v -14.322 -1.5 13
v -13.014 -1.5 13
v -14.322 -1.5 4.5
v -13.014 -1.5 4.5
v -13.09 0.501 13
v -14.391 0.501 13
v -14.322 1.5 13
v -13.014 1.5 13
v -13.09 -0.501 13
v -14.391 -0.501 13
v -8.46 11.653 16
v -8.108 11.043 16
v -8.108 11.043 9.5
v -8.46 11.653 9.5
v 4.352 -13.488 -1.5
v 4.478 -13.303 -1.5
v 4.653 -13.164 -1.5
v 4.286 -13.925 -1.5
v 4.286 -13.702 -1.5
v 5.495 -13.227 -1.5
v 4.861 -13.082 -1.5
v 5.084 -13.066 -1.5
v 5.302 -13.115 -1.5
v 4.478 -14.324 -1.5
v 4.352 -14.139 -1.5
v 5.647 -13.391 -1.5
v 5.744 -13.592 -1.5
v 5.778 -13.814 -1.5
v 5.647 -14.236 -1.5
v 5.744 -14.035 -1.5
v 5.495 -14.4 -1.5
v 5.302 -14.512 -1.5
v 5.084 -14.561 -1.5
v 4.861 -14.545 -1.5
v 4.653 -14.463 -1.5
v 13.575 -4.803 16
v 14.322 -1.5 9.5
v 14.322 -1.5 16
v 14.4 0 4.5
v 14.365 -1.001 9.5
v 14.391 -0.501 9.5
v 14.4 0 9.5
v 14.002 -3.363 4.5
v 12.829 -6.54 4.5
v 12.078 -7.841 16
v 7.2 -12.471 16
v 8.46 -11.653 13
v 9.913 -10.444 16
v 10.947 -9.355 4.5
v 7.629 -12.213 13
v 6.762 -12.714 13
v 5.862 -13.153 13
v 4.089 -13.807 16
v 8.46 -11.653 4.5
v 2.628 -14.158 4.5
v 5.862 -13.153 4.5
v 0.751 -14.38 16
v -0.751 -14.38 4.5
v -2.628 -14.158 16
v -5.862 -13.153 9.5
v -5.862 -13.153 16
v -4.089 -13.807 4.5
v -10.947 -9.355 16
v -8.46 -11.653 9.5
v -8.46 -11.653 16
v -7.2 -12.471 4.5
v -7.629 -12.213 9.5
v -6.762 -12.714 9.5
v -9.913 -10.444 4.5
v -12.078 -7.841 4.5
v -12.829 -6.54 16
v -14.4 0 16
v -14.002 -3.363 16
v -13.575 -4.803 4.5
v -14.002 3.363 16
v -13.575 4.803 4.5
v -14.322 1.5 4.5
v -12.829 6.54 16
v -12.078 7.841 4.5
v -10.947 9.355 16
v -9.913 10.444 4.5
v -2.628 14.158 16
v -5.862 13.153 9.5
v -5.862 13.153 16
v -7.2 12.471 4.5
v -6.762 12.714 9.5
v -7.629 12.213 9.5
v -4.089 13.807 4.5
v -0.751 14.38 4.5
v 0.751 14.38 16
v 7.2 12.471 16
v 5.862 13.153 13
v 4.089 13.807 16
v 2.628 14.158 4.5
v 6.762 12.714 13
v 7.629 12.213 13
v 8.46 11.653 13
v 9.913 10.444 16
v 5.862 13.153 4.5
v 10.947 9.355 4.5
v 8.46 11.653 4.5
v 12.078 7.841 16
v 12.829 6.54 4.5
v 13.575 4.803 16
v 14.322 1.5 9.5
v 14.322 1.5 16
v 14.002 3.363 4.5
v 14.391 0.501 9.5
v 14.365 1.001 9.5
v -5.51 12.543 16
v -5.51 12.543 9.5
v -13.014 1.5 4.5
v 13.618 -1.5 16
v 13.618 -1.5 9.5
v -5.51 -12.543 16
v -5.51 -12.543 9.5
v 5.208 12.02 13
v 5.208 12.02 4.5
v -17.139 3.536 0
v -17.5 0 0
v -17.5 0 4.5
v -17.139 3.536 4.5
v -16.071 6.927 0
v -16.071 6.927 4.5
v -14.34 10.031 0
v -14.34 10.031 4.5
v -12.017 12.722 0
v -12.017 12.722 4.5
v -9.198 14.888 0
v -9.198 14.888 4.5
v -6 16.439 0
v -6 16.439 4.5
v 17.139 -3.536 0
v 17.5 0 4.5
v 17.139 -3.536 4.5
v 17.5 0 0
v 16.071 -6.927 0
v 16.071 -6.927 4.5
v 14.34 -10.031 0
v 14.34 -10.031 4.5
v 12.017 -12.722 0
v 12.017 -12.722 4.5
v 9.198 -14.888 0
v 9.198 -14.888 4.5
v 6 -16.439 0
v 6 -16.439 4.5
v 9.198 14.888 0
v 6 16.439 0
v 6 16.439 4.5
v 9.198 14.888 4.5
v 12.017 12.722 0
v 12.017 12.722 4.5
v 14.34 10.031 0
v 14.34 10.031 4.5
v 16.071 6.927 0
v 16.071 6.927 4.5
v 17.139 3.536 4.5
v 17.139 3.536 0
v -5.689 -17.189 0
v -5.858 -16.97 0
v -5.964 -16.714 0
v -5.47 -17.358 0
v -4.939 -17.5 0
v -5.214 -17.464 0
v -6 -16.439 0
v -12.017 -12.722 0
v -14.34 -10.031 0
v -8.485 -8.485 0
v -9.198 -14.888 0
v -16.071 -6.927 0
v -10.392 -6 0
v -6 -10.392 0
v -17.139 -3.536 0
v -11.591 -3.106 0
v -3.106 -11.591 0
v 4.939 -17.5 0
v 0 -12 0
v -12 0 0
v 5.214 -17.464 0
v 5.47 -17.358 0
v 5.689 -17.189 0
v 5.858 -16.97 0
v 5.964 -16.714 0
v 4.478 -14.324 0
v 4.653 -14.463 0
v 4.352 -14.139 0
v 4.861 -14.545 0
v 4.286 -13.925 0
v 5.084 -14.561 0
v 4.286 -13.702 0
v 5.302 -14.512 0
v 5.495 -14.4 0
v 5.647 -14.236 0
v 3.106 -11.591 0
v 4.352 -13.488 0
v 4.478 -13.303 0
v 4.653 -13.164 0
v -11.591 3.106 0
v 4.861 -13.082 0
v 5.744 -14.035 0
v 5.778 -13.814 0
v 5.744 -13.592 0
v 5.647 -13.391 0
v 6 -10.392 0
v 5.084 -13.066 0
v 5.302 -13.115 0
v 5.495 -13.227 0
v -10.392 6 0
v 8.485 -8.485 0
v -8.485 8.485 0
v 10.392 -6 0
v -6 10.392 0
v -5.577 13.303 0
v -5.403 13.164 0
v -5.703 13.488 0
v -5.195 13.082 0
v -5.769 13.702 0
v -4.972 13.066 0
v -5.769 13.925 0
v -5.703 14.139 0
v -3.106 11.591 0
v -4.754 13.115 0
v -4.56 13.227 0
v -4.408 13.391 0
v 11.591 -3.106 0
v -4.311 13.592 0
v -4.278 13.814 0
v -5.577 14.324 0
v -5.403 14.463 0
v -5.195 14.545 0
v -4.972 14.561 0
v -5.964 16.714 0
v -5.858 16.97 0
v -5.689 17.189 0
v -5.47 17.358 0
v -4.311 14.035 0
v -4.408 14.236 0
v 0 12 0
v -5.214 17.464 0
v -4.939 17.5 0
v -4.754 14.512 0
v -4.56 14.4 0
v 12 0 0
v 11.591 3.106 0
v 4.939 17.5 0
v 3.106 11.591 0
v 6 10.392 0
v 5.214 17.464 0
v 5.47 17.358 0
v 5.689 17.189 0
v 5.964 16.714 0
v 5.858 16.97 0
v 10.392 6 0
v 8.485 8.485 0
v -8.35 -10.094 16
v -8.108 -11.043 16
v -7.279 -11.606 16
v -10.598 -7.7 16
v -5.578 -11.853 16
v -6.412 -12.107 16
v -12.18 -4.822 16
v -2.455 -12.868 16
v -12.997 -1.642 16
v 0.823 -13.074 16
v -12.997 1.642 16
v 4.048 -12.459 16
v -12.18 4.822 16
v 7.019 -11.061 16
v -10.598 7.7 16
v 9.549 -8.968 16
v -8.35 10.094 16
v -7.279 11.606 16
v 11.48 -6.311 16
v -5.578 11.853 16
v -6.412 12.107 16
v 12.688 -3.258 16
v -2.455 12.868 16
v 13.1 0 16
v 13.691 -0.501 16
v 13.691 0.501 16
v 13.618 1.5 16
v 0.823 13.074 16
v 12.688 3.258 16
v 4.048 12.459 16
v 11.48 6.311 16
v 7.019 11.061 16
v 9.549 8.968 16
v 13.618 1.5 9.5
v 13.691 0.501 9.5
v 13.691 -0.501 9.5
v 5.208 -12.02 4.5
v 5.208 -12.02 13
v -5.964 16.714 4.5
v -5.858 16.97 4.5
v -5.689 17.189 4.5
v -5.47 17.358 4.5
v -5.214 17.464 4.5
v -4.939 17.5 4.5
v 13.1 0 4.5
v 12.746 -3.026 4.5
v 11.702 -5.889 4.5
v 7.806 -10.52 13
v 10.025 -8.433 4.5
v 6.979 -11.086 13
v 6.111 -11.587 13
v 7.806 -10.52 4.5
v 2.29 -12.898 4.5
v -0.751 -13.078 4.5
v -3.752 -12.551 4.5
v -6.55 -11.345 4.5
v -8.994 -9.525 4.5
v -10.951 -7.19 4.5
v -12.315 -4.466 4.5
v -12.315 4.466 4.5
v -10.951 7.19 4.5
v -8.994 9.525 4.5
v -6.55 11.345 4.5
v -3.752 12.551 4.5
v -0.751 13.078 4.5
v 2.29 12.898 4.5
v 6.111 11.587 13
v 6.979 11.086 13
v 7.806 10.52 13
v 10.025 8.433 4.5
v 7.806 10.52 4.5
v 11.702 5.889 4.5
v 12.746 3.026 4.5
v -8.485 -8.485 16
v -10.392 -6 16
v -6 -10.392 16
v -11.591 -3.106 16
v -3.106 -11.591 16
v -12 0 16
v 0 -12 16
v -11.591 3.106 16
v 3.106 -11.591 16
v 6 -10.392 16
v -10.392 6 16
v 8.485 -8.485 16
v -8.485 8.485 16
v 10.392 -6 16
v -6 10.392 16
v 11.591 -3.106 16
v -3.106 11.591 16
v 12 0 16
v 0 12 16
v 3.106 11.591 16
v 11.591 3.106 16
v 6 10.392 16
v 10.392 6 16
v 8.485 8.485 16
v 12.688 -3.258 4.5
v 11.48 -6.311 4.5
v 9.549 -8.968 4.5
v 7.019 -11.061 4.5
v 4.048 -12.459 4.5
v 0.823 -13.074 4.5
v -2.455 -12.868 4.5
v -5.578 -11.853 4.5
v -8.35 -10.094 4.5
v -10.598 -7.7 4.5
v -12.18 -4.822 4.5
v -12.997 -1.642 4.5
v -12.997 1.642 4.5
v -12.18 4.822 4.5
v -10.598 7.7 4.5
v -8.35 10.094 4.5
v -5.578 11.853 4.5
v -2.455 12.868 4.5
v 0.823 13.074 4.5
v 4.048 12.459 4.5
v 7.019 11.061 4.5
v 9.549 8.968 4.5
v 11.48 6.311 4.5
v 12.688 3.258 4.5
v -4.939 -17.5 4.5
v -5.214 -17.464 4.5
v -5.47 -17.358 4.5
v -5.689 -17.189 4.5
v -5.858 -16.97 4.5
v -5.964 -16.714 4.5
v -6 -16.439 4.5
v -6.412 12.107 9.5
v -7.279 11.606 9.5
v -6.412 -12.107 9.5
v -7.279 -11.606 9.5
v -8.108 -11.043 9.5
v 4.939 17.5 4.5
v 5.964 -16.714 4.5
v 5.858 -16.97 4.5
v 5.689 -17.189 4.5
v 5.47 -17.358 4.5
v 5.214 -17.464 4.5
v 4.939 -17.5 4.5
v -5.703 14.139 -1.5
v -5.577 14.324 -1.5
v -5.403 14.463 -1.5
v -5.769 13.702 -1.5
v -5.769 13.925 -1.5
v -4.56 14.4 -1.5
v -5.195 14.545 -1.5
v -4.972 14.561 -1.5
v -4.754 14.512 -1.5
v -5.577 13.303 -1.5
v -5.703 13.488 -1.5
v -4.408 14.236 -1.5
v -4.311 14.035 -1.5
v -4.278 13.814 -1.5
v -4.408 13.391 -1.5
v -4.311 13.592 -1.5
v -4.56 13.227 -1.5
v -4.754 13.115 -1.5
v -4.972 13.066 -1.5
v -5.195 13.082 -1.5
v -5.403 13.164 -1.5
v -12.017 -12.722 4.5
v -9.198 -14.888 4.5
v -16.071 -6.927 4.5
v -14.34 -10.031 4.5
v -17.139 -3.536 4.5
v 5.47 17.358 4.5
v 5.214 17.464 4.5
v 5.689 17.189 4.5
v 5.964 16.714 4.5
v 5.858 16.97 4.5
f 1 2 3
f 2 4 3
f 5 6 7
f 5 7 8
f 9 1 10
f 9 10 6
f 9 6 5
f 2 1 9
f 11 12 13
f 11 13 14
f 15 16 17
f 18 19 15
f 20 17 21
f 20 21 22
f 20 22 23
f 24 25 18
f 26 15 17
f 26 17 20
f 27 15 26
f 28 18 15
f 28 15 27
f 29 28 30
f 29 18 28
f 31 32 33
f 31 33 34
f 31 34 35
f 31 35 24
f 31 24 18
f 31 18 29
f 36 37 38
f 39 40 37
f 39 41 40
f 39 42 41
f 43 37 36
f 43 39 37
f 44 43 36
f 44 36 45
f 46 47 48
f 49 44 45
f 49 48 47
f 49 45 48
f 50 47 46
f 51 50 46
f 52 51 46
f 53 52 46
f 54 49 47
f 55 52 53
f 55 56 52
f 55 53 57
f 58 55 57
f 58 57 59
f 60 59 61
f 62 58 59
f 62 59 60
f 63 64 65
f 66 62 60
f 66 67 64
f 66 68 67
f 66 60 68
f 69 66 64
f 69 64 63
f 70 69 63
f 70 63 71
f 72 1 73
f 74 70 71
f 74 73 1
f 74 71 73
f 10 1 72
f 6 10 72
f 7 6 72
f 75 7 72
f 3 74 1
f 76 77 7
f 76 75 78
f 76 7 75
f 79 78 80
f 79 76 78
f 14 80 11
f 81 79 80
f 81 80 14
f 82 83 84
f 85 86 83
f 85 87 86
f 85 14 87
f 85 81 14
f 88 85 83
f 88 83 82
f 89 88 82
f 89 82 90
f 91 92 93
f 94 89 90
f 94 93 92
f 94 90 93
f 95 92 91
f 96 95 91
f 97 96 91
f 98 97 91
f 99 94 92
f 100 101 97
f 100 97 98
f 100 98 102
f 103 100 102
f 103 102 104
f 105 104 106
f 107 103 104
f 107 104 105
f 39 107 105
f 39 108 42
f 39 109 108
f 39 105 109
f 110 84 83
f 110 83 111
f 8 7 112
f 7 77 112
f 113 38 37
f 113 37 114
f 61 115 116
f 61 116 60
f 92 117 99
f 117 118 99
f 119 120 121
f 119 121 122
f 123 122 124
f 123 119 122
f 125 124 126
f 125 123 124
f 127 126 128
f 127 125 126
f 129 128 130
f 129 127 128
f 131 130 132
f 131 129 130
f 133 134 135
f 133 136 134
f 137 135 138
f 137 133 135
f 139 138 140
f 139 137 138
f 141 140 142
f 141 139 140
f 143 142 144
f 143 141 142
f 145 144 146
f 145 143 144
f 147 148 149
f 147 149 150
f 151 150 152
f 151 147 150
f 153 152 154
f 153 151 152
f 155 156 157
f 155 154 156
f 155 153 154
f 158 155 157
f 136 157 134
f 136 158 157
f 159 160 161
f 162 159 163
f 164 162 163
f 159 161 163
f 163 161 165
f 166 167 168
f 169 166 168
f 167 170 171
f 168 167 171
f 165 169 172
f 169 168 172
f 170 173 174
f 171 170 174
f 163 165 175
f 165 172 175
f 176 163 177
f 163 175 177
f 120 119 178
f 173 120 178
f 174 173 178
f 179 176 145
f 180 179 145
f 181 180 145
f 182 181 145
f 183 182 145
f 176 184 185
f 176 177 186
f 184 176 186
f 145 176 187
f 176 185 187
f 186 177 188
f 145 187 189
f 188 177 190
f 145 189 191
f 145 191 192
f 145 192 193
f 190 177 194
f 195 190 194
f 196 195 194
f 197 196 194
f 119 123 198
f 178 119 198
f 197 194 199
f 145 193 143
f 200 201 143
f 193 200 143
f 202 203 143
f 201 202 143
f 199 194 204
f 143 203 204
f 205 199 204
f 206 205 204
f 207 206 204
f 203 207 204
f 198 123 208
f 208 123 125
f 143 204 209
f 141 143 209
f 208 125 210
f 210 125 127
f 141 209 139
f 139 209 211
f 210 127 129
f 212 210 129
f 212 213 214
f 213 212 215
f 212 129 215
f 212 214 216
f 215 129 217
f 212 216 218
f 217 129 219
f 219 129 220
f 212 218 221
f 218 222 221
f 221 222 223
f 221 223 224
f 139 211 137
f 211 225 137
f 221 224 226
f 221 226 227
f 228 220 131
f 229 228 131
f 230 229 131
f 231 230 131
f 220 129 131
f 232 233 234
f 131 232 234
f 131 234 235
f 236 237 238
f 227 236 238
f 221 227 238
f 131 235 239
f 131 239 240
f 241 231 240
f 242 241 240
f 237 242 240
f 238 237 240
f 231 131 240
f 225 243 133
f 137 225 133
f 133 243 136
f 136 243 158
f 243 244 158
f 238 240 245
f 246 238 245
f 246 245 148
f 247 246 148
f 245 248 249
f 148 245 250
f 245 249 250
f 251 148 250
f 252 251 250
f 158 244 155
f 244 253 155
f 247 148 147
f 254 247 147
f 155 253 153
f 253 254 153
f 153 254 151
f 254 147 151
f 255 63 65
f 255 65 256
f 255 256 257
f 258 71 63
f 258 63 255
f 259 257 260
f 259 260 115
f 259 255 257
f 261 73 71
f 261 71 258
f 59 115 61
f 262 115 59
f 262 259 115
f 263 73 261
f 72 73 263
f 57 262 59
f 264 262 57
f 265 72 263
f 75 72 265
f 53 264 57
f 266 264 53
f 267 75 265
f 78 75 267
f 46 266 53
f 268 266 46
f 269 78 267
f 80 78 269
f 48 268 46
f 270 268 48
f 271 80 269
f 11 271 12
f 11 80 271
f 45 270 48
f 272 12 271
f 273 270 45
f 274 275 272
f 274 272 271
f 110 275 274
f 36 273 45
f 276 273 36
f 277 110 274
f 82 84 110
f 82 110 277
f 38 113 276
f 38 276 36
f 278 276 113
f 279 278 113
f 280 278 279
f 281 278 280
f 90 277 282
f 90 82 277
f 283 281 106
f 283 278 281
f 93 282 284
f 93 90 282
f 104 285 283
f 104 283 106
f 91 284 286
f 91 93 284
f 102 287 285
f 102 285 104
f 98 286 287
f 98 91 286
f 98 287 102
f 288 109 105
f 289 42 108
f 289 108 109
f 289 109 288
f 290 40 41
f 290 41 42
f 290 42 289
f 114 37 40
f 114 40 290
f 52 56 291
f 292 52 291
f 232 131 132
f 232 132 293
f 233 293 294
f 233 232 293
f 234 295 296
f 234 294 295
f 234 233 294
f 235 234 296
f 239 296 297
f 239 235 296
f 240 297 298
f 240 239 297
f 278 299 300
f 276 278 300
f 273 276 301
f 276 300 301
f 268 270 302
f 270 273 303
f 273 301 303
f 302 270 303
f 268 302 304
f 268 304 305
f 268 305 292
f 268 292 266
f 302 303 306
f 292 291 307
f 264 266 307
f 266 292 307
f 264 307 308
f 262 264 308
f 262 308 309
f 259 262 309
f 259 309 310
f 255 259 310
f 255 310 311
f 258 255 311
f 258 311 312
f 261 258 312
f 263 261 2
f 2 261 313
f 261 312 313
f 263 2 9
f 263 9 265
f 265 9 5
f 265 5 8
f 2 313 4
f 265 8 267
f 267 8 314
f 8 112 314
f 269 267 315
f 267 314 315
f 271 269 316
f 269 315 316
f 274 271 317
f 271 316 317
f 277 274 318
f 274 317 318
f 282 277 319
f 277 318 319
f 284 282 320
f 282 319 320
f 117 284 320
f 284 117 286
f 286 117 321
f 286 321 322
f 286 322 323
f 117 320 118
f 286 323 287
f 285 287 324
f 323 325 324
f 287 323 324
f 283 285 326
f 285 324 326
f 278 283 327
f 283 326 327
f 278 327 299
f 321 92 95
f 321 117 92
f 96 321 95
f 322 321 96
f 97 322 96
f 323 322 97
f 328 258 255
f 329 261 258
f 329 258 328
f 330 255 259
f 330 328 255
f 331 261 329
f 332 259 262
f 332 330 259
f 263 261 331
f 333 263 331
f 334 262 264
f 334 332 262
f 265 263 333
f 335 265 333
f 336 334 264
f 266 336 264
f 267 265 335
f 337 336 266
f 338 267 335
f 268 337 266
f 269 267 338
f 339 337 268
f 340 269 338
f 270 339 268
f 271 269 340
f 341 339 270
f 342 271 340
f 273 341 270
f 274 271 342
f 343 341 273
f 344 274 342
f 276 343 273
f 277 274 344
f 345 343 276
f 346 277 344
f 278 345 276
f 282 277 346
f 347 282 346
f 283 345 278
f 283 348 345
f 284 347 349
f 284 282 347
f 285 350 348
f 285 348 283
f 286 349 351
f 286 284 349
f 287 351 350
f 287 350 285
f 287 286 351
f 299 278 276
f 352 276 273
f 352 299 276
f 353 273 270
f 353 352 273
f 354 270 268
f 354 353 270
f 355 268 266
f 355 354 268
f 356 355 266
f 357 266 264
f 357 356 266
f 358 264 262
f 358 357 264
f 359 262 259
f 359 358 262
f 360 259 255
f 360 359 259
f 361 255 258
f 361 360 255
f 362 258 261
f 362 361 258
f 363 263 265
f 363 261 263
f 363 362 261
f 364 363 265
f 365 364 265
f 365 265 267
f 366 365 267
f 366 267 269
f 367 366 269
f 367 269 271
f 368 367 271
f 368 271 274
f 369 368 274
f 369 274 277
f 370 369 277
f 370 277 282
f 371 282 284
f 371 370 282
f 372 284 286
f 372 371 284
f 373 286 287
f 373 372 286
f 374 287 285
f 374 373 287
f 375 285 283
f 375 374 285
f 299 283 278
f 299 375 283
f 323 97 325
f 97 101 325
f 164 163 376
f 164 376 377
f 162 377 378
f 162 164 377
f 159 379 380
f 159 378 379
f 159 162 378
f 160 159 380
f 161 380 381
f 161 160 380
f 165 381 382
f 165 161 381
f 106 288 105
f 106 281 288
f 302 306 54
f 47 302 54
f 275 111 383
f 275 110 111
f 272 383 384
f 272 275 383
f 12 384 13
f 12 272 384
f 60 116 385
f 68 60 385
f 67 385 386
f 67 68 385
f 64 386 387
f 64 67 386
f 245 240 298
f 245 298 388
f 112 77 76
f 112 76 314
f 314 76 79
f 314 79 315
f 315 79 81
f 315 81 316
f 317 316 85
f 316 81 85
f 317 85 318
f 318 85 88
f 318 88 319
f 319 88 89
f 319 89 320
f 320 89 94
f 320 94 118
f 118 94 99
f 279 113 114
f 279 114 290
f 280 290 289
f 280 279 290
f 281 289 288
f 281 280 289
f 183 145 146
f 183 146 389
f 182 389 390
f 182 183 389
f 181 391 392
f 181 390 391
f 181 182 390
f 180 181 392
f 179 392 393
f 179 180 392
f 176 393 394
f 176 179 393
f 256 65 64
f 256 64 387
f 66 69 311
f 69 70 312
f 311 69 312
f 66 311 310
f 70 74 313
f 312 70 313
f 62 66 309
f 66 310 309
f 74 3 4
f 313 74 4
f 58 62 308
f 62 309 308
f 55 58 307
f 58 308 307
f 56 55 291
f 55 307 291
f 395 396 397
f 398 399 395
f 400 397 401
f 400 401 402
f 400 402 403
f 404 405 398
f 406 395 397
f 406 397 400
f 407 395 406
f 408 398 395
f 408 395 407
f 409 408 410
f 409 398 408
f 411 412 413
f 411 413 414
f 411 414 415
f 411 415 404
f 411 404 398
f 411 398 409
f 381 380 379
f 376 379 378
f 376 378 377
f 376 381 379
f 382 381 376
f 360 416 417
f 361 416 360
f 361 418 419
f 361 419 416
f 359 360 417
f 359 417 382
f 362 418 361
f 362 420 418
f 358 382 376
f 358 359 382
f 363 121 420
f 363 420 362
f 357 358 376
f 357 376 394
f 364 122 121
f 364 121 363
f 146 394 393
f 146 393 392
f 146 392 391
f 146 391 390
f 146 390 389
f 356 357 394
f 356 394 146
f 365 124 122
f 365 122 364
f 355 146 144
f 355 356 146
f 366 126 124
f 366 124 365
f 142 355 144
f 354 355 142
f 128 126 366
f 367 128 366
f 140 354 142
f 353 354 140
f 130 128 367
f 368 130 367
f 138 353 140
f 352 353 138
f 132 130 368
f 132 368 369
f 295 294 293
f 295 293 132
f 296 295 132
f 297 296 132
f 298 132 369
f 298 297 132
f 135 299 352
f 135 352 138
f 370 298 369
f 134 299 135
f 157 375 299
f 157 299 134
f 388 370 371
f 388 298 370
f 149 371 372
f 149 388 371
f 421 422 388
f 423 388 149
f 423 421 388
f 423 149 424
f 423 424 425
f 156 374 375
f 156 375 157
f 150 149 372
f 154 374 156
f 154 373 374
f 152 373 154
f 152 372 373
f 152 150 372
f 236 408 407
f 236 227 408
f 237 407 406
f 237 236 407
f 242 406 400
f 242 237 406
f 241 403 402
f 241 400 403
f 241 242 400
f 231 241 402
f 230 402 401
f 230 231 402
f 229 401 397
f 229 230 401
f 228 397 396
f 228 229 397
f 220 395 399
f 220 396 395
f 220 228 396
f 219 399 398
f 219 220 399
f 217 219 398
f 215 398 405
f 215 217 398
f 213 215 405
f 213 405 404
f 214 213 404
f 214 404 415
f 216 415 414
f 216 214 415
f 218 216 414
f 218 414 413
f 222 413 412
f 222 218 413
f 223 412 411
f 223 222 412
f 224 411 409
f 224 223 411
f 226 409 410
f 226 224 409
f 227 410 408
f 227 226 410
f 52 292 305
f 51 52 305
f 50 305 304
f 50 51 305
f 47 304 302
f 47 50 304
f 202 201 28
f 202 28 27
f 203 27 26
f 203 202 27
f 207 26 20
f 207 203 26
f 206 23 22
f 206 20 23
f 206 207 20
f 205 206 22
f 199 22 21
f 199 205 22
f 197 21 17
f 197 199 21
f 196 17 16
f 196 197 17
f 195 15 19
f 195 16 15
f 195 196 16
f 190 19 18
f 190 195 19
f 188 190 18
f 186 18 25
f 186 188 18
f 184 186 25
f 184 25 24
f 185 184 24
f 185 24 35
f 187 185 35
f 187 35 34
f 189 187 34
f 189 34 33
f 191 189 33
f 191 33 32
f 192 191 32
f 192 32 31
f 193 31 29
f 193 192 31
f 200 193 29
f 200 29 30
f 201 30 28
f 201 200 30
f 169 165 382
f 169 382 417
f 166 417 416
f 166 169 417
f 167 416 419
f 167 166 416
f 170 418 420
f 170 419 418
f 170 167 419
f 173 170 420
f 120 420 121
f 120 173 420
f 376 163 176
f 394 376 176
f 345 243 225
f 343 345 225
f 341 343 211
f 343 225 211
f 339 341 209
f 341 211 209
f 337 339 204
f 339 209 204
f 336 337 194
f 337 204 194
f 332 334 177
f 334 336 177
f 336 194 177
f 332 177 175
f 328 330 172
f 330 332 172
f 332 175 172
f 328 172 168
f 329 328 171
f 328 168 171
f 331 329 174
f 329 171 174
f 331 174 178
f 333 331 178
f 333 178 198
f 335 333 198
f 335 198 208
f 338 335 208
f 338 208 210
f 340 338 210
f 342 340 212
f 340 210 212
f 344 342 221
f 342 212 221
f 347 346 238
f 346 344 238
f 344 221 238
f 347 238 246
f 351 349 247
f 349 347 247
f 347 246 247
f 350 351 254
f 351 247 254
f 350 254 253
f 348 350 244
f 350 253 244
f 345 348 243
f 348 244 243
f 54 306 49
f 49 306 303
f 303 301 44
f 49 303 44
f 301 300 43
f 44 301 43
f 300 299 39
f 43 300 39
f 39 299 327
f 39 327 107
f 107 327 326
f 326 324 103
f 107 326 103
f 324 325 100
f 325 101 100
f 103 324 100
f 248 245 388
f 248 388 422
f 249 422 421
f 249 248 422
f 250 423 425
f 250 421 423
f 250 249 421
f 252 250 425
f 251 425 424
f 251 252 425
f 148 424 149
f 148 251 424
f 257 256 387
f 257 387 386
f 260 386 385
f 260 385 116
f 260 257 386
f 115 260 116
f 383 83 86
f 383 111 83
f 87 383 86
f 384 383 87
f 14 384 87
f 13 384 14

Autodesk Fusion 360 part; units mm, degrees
sketch "Sketch1" plane through (0, 0, 0) normal (0, 0, 1) x (1, 0, 0)
  line L0 (-4.9393, 17.5) -> (4.9393, 17.5)
  arc A0 (17.5, 0) -> (6, 16.4393) centre (0, 0) ccw
  arc A1 (-6, 16.4393) -> (-17.5, 0) centre (0, 0) ccw
  arc A2 (-4.9393, 17.5) -> (-6, 16.4393) centre (-4.9393, 16.4393) ccw
  arc A3 (6, 16.4393) -> (4.9393, 17.5) centre (4.9393, 16.4393) ccw
  line L1 (-17.5, 0) -> (17.5, 0) construction
  arc A4 (-17.5, 0) -> (-6, -16.4393) centre (0, 0) ccw
  arc A5 (-6, -16.4393) -> (-4.9393, -17.5) centre (-4.9393, -16.4393) ccw
  line L2 (-4.9393, -17.5) -> (4.9393, -17.5)
  arc A6 (4.9393, -17.5) -> (6, -16.4393) centre (4.9393, -16.4393) ccw
  arc A7 (6, -16.4393) -> (17.5, 0) centre (0, 0) ccw
  circle A8 centre (0, 0) radius 12.7
  dimension "d2" = 35
  dimension "d4" = 12
  dimension "d7" = 25.4
extrude "Extrude1" add sketch "Sketch1" along normal blind 4.5 makes body 1
sketch "Sketch3" plane through (0, 0, 4.5) normal (0, 0, 1) x (1, 0, 0)
  circle A0 centre (0, 0) radius 14.4
  circle A1 centre (0, 0) radius 12.7
  arc A2 (-4.9393, 17.5) -> (-6, 16.4393) centre (-4.9393, 16.4393) ccw
  arc A3 (-6, 16.4393) -> (-6, -16.4393) centre (0, 0) ccw
  arc A4 (-6, -16.4393) -> (-4.9393, -17.5) centre (-4.9393, -16.4393) ccw
  line L0 (-4.9393, -17.5) -> (4.9393, -17.5)
  arc A5 (4.9393, -17.5) -> (6, -16.4393) centre (4.9393, -16.4393) ccw
  arc A6 (6, -16.4393) -> (6, 16.4393) centre (0, 0) ccw
  arc A7 (6, 16.4393) -> (4.9393, 17.5) centre (4.9393, 16.4393) ccw
  line L1 (4.9393, 17.5) -> (-4.9393, 17.5)
  circle A8 centre (0, 0) radius 13.1
  dimension "d8" = 28.8
  dimension "d9" = 1.3
extrude "Extrude2" add sketch "Sketch3" along normal blind 11.5 separate body contours A0 makes body 2
sketch "Sketch4" plane through (0, 0, 4.5) normal (0, 0, -1) x (1, 0, 0)
  circle A0 centre (0, 0) radius 13.1
  circle A1 centre (0, 0) radius 14.4
  line L0 (-14.3217, -1.5) -> (-13.0138, -1.5)
  line L1 (-13.0138, 1.5) -> (-14.3217, 1.5)
  line L2 (8.4599, -11.6529) -> (7.806, -10.5203)
  line L3 (5.2079, -12.0203) -> (5.8618, -13.1529)
  line L4 (5.8618, 13.1529) -> (5.2079, 12.0203)
  line L5 (7.806, 10.5203) -> (8.4599, 11.6529)
  dimension "d13" = 3
  dimension "d15" = 360
extrude "Extrude3" cut sketch "Sketch4" against normal blind 8.5 contours A0 A1 L4 L5 | A0 A1 L2 L3 | A0 A1 L0 L1 bodies 2
sketch "Sketch5" plane through (0, 0, 16) normal (0, 0, 1) x (-1, 0, 0)
  circle A0 centre (0, 0) radius 13.1
  circle A1 centre (0, 0) radius 14.4
  line L0 (-14.3217, 1.5) -> (-13.6176, 1.5)
  arc A2 (-13.6176, 1.5) -> (-13.6176, -1.5) centre (0, 0) ccw
  line L1 (-13.6176, -1.5) -> (-14.3217, -1.5)
  arc A3 (5.5098, -12.5432) -> (8.1079, -11.0432) centre (0, 0) ccw
  line L2 (8.1079, -11.0432) -> (8.4599, -11.6529)
  line L3 (5.8618, -13.1529) -> (5.5098, -12.5432)
  arc A4 (8.1079, 11.0432) -> (5.5098, 12.5432) centre (0, 0) ccw
  line L4 (5.5098, 12.5432) -> (5.8618, 13.1529)
  line L5 (8.4599, 11.6529) -> (8.1079, 11.0432)
  dimension "d18" = 3
  dimension "d19" = 0.7
  dimension "d21" = 360
extrude "Extrude4" cut sketch "Sketch5" against normal blind 6.5 contours A1 A4 L4 L5 | A1 A3 L2 L3 | A1 L0 A2 L1 bodies 2
sketch "Sketch6" plane through (0, 0, 0) normal (0, 0, 1) x (1, 0, 0)
  circle A0 centre (0, 0) radius 13.1
  circle A1 centre (0, 0) radius 12
  dimension "d26" = 24
extrude "Extrude5" add sketch "Sketch6" along normal up to surface (16 mm away) bodies 1
sketch "Sketch7" plane through (0, 0, 0) normal (0, 0, -1) x (1, 0, 0)
  circle A0 centre (0, 0) radius 12
  arc A1 (-6, -16.4393) -> (-4.9393, -17.5) centre (-4.9393, -16.4393) ccw
  line L0 (-4.9393, -17.5) -> (4.9393, -17.5)
  arc A2 (4.9393, -17.5) -> (6, -16.4393) centre (4.9393, -16.4393) ccw
  arc A3 (6, -16.4393) -> (6, 16.4393) centre (0, 0) ccw
  arc A4 (6, 16.4393) -> (4.9393, 17.5) centre (4.9393, 16.4393) ccw
  line L1 (4.9393, 17.5) -> (-4.9393, 17.5)
  arc A5 (-4.9393, 17.5) -> (-6, 16.4393) centre (-4.9393, 16.4393) ccw
  arc A6 (-6, 16.4393) -> (-6, -16.4393) centre (0, 0) ccw
  circle A7 centre (-5.0277, -13.8135) radius 0.75
  line L2 (-5.0277, -13.8135) -> (5.0277, 13.8135) construction
  circle A8 centre (5.0277, 13.8135) radius 0.75
  line L3 (0, -1.75) -> (0, -22.5) construction
  dimension "d27" = 20
  dimension "d28" = 1.5
  dimension "d29" = 29.4
extrude "Extrude6" add sketch "Sketch7" along normal blind 1.5 contours A7 | A8 bodies 1
equation "d9 = 2.4 mm - 1.1 mm"
equation "d16 = 3 mm - 11.50 mm"
equation "d19 = 2.3 mm - 1.6 mm"
